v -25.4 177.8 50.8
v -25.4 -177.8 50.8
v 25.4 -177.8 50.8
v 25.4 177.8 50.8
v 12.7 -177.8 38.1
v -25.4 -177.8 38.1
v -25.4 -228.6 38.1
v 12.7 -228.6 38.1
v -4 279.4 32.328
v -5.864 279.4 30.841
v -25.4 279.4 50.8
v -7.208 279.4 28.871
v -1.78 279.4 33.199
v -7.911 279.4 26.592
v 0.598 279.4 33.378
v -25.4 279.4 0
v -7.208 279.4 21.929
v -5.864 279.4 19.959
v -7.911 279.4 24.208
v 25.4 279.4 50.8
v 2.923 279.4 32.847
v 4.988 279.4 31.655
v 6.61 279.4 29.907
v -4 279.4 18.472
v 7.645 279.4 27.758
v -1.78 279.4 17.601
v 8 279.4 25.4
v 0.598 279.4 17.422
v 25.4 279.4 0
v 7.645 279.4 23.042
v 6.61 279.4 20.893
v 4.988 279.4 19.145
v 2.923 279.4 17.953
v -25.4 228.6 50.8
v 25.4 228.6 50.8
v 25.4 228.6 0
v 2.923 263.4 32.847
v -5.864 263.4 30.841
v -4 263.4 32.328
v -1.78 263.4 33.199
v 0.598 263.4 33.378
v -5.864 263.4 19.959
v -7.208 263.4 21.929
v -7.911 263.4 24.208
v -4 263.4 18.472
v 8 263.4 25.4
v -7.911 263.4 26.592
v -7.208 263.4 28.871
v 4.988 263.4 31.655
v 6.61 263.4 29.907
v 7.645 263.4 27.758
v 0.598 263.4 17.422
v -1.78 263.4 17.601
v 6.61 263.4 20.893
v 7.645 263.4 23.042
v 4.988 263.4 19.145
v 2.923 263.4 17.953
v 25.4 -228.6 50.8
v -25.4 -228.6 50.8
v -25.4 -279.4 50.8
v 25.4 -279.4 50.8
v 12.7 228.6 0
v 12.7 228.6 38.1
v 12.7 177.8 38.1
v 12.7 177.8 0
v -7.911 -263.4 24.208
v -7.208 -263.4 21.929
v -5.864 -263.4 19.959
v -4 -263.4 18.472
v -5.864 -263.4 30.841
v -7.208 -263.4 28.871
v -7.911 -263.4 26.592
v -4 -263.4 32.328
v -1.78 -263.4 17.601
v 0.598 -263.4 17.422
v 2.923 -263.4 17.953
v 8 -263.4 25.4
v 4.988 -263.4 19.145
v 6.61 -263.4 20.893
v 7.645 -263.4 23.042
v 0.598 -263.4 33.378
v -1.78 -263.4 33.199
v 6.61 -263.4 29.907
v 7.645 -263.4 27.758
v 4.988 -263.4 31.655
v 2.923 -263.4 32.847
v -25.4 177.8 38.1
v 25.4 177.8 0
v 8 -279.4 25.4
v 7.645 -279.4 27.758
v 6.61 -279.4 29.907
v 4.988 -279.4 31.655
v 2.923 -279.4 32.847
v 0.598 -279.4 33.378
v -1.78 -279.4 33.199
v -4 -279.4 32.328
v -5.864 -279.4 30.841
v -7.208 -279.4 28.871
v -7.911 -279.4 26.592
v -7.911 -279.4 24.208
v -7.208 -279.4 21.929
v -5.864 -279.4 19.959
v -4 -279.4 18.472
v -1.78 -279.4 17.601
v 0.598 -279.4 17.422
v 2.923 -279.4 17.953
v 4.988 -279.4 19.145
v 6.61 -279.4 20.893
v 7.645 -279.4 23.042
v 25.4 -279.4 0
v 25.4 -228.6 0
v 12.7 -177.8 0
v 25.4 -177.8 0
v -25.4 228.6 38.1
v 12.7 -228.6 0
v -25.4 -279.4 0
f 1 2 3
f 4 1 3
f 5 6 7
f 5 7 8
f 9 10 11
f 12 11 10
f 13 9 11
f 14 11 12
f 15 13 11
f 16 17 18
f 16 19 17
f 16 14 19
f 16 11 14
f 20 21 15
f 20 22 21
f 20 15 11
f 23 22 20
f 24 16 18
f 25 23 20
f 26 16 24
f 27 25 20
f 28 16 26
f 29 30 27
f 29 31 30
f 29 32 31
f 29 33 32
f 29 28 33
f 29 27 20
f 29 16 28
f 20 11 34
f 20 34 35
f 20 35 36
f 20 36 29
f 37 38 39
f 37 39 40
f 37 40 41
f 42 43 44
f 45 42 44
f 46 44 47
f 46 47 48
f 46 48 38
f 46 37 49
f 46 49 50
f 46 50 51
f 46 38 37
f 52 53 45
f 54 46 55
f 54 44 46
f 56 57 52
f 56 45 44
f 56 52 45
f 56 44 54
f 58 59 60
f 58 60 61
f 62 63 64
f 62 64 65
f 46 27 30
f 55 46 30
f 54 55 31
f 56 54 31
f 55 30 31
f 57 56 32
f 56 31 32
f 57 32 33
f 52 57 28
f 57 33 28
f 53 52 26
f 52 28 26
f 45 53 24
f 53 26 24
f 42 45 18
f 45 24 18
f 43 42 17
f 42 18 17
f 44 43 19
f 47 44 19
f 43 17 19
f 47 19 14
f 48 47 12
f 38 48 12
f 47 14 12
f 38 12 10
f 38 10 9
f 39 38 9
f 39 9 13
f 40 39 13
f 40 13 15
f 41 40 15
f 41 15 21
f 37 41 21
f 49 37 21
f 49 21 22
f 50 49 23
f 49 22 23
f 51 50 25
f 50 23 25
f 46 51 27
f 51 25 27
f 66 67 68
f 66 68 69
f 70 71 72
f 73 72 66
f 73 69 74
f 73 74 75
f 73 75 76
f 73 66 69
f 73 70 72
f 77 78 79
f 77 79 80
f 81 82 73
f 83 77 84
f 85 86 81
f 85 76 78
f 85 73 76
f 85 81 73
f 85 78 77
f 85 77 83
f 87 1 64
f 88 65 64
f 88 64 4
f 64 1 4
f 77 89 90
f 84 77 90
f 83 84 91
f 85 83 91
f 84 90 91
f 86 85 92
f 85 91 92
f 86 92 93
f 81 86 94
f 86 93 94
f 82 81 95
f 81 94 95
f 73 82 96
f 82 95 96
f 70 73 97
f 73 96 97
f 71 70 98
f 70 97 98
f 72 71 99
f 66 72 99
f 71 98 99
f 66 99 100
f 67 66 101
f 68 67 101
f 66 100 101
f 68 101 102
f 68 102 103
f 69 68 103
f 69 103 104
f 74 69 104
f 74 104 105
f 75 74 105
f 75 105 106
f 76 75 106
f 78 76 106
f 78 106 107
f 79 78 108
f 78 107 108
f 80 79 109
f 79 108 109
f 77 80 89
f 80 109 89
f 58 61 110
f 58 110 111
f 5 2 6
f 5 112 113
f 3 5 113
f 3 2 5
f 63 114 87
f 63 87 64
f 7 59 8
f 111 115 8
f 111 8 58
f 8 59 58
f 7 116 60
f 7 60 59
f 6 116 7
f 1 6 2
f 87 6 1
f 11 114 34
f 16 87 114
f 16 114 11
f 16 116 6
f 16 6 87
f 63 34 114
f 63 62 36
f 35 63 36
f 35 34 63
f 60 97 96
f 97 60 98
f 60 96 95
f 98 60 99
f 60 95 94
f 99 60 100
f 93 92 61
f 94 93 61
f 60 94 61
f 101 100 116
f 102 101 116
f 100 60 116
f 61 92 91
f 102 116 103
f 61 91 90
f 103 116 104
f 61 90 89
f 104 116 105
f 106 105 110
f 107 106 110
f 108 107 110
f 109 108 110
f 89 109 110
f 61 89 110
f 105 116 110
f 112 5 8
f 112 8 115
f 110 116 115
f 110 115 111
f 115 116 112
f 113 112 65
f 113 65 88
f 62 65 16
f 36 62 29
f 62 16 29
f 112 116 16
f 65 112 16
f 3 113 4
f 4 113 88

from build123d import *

# Parameters (mm, degrees)
SKETCH2_W           = 50.8
SKETCH2_H           = 558.8
BOSS_EXTRUDE1_DEPTH = 50.8
SKETCH5_W           = 50.8
SKETCH5_H           = 50.8
CUT_EXTRUDE1_DEPTH  = 12.7
SKETCH6_W           = 50.8
SKETCH6_H           = 50.8
CUT_EXTRUDE2_DEPTH  = 12.7
SKETCH10_W          = 50.8
SKETCH10_H          = 50.8
CUT_EXTRUDE3_DEPTH  = 12.7
SKETCH11_W          = 50.8
SKETCH11_H          = 50.8
CUT_EXTRUDE4_DEPTH  = 12.7
SKETCH12_R          = 8
CUT_EXTRUDE5_DEPTH  = 16
SKETCH13_R          = 8
CUT_EXTRUDE6_DEPTH  = 16


with BuildPart() as part:
    # Sketch2 → Boss-Extrude1 (new body)
    with BuildSketch(Plane.XY):
        Rectangle(SKETCH2_W, SKETCH2_H)
    extrude(amount=BOSS_EXTRUDE1_DEPTH)

    # Sketch5 → Cut-Extrude1 (cut)
    with BuildSketch(Plane.XY.offset(50.8)):
        with Locations((0, 203.2)):
            Rectangle(SKETCH5_W, SKETCH5_H)
    extrude(amount=-CUT_EXTRUDE1_DEPTH, mode=Mode.SUBTRACT)

    # Sketch6 → Cut-Extrude2 (cut)
    with BuildSketch(Plane(origin=(25.4, 0, 0), x_dir=(0, 0, -1), z_dir=(1, 0, 0))):
        with Locations((-25.4, 203.2)):
            Rectangle(SKETCH6_W, SKETCH6_H)
    extrude(amount=-CUT_EXTRUDE2_DEPTH, mode=Mode.SUBTRACT)

    # Sketch10 → Cut-Extrude3 (cut)
    with BuildSketch(Plane.XY.offset(50.8)):
        with Locations((0, -203.2)):
            Rectangle(SKETCH10_W, SKETCH10_H)
    extrude(amount=-CUT_EXTRUDE3_DEPTH, mode=Mode.SUBTRACT)

    # Sketch11 → Cut-Extrude4 (cut)
    with BuildSketch(Plane(origin=(25.4, 0, 0), x_dir=(0, 0, -1), z_dir=(1, 0, 0))):
        with Locations((-25.4, -203.2)):
            Rectangle(SKETCH11_W, SKETCH11_H)
    extrude(amount=-CUT_EXTRUDE4_DEPTH, mode=Mode.SUBTRACT)

    # Sketch12 → Cut-Extrude5 (cut)
    with BuildSketch(Plane.XZ.offset(279.4)):
        with Locations((0, 25.4)):
            Circle(SKETCH12_R)
    extrude(amount=-CUT_EXTRUDE5_DEPTH, mode=Mode.SUBTRACT)

    # Sketch13 → Cut-Extrude6 (cut)
    with BuildSketch(Plane(origin=(0, 279.4, 0), x_dir=(1, 0, 0), z_dir=(0, 1, 0))):
        with Locations((0, -25.4)):
            Circle(SKETCH13_R)
    extrude(amount=-CUT_EXTRUDE6_DEPTH, mode=Mode.SUBTRACT)


solid = part.part
